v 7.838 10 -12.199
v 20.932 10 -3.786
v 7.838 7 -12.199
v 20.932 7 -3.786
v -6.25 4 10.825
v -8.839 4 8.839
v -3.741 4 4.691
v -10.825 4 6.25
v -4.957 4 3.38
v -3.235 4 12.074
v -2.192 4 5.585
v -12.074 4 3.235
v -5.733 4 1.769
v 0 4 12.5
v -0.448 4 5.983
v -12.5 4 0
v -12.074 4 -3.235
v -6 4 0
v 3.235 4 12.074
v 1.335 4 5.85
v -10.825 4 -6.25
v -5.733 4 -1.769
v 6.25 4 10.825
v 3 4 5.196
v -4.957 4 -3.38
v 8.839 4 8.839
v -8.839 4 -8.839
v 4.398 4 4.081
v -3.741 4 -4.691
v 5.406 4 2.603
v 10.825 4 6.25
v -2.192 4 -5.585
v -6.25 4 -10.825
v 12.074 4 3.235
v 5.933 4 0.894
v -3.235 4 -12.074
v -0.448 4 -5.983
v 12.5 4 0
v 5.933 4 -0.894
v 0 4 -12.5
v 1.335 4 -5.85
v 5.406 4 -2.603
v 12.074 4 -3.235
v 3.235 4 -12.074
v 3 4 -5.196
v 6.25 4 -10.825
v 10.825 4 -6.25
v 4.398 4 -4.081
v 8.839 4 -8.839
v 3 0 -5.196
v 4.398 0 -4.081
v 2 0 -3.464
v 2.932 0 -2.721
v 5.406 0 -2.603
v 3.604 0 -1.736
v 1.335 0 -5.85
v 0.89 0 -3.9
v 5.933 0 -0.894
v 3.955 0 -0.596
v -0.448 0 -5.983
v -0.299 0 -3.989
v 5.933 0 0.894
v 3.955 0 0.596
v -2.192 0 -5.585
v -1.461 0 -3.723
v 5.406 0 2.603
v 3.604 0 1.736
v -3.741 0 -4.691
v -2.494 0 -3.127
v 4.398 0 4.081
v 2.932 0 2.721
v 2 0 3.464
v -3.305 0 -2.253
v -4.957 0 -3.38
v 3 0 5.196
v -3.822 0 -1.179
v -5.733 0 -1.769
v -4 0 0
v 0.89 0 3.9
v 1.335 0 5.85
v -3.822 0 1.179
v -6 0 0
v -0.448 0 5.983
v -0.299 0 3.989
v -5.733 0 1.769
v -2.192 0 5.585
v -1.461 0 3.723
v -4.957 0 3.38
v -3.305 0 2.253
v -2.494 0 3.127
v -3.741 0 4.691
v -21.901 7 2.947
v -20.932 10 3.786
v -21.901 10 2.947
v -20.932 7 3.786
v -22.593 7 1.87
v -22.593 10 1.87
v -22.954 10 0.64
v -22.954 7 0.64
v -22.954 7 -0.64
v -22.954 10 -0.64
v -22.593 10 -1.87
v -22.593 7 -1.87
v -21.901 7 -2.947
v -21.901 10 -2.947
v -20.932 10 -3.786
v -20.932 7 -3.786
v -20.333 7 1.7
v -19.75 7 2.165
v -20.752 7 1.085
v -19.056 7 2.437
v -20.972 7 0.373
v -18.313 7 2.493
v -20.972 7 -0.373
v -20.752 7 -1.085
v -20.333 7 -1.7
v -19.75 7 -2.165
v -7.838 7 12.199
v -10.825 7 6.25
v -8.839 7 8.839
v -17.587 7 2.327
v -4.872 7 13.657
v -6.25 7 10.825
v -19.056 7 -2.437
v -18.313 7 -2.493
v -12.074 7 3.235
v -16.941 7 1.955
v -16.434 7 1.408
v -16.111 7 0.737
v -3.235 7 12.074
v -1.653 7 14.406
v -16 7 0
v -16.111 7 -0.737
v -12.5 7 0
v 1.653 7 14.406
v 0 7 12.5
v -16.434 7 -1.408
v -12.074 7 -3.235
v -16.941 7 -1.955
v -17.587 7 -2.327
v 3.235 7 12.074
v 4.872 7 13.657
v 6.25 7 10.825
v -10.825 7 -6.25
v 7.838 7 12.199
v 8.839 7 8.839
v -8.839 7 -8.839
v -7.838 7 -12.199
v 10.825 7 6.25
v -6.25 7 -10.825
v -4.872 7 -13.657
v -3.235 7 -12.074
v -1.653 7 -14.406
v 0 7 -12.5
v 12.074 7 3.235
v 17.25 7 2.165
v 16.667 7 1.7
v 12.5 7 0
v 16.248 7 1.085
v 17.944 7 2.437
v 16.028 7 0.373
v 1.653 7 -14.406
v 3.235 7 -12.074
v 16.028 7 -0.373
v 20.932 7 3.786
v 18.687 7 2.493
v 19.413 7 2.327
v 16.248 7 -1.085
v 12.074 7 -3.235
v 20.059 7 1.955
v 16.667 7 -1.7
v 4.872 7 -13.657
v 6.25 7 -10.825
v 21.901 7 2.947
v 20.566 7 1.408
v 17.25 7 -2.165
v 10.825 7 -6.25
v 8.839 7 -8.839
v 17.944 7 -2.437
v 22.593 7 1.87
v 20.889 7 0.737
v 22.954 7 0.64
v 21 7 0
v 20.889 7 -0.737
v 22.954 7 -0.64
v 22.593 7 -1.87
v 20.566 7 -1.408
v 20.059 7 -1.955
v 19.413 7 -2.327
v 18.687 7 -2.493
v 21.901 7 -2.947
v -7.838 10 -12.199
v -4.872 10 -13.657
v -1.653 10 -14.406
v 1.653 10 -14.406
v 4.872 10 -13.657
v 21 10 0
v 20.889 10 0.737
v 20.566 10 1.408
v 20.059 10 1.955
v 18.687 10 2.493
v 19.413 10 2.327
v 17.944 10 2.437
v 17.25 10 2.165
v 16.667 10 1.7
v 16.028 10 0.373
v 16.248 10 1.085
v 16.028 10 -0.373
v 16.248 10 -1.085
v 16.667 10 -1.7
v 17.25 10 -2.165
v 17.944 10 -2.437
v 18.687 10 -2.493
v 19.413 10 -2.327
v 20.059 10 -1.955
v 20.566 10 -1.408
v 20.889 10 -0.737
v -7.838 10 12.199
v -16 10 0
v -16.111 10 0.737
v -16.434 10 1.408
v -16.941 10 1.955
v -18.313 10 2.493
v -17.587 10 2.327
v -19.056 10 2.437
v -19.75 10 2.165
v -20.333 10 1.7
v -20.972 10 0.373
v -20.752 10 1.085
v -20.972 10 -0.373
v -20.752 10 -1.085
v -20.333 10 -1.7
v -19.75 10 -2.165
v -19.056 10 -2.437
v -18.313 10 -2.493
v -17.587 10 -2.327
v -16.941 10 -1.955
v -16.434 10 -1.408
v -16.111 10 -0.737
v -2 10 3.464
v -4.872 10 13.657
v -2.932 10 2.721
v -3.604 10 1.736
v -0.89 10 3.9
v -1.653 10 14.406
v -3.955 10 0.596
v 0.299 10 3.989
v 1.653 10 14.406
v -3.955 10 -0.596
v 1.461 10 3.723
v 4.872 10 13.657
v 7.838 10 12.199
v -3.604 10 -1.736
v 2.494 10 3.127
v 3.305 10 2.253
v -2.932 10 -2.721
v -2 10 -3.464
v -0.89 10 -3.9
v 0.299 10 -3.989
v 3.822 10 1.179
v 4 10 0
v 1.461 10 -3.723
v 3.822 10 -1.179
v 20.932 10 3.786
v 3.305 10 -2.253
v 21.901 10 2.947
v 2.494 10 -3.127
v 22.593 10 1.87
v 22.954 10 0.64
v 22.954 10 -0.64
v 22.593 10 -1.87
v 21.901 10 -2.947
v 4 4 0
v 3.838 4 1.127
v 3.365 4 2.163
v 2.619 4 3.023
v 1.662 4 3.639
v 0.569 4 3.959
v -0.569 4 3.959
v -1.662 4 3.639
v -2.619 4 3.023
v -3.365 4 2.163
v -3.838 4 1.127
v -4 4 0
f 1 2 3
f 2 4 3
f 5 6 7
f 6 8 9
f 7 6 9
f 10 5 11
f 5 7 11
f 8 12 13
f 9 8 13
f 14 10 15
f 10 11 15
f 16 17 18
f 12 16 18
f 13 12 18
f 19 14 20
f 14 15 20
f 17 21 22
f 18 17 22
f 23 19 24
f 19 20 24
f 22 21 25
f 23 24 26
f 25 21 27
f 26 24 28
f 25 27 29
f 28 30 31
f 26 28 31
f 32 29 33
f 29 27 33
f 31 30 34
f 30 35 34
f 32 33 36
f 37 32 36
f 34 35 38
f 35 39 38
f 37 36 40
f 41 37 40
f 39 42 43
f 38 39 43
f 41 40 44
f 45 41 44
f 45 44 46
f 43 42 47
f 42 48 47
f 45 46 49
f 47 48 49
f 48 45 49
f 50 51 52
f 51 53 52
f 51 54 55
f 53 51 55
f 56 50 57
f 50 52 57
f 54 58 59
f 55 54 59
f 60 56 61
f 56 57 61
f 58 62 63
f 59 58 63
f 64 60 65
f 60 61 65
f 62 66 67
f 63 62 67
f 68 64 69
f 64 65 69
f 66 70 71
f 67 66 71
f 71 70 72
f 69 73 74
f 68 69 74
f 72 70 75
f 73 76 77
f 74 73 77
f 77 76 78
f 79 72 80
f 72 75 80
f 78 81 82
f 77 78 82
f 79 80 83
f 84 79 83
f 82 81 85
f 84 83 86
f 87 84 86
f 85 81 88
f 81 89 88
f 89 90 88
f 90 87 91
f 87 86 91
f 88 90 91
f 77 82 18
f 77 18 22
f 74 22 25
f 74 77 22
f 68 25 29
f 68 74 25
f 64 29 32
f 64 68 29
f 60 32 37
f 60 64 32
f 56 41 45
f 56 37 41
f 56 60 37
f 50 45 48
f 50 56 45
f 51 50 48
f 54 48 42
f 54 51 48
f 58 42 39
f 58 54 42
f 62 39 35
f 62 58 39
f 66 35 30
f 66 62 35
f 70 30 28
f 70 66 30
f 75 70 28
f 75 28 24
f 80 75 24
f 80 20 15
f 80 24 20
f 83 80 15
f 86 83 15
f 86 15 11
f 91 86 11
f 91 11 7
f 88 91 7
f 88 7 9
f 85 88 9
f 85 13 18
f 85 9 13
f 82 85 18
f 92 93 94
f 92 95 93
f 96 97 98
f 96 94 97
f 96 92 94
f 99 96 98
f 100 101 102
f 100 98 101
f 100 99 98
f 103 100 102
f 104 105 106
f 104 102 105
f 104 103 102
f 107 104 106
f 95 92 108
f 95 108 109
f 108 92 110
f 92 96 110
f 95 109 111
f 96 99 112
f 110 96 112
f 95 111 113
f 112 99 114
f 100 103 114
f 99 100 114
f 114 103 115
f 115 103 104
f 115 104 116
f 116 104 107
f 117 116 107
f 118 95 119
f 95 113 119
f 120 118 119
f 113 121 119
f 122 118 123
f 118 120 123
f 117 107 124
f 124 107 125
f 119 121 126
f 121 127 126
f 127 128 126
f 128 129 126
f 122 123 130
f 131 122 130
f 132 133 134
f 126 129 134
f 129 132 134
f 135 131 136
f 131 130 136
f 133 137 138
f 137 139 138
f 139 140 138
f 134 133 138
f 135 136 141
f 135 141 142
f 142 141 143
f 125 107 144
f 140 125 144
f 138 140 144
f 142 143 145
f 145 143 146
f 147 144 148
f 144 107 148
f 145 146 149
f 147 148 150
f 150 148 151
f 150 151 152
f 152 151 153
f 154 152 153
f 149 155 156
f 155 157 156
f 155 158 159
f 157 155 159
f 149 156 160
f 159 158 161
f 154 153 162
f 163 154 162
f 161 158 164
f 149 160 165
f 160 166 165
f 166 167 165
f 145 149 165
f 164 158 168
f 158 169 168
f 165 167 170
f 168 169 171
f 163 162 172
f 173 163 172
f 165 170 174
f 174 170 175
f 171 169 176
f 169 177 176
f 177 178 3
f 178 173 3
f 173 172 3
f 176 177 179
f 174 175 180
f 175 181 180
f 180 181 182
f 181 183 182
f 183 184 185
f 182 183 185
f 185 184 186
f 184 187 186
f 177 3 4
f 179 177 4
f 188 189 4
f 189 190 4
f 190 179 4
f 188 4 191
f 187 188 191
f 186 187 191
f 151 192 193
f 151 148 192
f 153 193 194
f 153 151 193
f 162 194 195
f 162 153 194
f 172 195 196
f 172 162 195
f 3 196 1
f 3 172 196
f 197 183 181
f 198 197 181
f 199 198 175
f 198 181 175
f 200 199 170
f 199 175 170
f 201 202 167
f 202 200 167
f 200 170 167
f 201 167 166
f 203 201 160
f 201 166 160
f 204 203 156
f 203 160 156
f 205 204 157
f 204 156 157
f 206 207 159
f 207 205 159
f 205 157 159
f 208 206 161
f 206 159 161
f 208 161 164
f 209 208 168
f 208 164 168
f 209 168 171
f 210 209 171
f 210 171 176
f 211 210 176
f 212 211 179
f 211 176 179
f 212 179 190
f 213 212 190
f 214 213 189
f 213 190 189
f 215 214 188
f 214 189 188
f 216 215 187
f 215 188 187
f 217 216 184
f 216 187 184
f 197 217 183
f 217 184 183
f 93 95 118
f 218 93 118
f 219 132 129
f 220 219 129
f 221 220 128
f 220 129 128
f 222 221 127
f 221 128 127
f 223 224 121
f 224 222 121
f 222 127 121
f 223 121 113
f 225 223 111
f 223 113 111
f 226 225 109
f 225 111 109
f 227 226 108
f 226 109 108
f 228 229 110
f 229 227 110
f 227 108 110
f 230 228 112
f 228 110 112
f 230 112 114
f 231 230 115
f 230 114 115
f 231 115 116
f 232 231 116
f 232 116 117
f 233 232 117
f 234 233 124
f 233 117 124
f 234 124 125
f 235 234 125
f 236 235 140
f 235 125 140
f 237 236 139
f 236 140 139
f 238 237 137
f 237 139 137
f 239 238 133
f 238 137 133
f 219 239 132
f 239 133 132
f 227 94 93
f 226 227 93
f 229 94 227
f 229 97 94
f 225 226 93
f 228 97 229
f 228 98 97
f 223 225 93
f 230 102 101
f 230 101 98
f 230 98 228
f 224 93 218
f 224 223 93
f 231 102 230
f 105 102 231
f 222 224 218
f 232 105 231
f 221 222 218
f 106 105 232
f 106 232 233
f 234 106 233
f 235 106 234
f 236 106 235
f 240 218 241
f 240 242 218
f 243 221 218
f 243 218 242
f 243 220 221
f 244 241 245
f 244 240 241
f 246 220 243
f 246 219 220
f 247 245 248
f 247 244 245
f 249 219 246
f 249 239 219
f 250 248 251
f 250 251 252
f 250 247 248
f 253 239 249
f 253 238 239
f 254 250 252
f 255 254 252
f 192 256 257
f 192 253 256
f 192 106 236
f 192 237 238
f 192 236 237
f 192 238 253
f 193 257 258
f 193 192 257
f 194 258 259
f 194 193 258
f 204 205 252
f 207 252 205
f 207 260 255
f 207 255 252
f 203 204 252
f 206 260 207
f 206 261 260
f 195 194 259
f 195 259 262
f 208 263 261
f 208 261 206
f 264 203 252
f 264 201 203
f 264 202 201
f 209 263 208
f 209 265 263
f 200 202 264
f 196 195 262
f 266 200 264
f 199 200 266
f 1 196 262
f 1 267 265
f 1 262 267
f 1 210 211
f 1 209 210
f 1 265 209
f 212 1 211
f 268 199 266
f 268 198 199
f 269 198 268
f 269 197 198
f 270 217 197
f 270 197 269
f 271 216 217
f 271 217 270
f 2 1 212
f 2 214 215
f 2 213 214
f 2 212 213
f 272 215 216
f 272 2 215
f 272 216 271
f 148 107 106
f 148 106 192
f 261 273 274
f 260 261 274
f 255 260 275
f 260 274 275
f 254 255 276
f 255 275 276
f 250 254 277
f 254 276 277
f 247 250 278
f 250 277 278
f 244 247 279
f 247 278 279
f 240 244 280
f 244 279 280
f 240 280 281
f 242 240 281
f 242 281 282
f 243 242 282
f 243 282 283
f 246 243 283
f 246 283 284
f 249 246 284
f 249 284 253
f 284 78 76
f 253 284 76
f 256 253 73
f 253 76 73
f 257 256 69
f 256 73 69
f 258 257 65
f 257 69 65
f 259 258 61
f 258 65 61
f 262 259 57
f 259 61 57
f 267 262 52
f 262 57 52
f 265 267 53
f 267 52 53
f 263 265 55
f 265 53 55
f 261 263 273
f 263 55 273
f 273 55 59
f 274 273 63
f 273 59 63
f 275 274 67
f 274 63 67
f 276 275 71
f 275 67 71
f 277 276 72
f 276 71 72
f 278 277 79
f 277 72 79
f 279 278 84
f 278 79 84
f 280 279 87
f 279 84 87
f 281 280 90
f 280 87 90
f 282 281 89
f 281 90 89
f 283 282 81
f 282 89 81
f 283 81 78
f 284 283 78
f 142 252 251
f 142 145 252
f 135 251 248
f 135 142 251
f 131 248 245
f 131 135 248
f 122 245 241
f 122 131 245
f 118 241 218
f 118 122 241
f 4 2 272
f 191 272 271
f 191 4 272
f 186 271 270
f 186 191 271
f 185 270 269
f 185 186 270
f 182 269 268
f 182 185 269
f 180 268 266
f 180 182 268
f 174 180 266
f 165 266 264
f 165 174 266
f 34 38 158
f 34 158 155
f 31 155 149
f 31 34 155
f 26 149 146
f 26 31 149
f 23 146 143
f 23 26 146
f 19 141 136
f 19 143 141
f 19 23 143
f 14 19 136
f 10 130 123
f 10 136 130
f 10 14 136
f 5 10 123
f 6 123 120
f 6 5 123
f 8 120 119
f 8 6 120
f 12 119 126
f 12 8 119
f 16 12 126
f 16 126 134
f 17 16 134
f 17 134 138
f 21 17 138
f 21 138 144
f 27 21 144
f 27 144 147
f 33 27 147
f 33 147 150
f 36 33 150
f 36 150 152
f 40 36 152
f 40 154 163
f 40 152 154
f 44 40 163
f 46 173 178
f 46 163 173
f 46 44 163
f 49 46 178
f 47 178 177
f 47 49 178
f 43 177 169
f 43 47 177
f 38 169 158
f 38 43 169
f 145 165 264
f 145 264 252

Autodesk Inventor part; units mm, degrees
ref_plane "YZ Plane" through (0, 0, 0) normal (1, 0, 0) x (0, 1, 0)
ref_plane "XZ Plane" through (0, 0, 0) normal (0, 1, 0) x (-1, 0, 0)
ref_plane "XY Plane" through (0, 0, 0) normal (0, 0, 1) x (1, 0, 0)
sketch "Sketch1" plane through (0, 0, 0) normal (0, 1, 0) x (-1, 0, 0)
  circle A0 centre (0, 0) radius 4
  circle A1 centre (0, 0) radius 6
  dimension "d0" = 8
  dimension "d1" = 2
extrude "Extrusion1" add sketch "Sketch1" along normal blind 4
sketch "Sketch2" plane through (0, 4, 0) normal (0, 1, 0) x (1, 0, 0)
  circle A0 centre (0, 0) radius 12.5
  circle A1 centre (0, 0) radius 4 projected
  dimension "d4" = 25
extrude "Extrusion2" add sketch "Sketch2" along normal blind 3
sketch "Sketch3" plane through (0, 7, 0) normal (0, 1, 0) x (1, 0, 0)
  circle A0 centre (-18.5, 0) radius 2.5
  circle A1 centre (18.5, 0) radius 2.5
  circle A2 centre (0, 0) radius 12.5 construction
  circle A3 centre (0, 0) radius 14.5
  circle A4 centre (-18.5, 0) radius 4.5
  circle A5 centre (18.5, 0) radius 4.5
  line L0 (-20.9324, 3.7859) -> (-7.8378, 12.1991)
  line L1 (-20.9324, -3.7859) -> (-7.8378, -12.1991)
  line L2 (20.9324, 3.7859) -> (7.8378, 12.1991)
  line L3 (20.9324, -3.7859) -> (7.8378, -12.1991)
  circle A6 centre (0, 0) radius 4 projected
  point P0 (-14.3851, -1.8215)
  point P1 (-14.3851, 1.8215)
  point P2 (14.3851, 1.8215)
  point P3 (14.3851, -1.8215)
  dimension "d7" = 5
  dimension "d8" = 5
  dimension "d9" = 37
  dimension "d10" = 18.5
  dimension "d11" = 2
  dimension "d12" = 2
  dimension "d13" = 2
extrude "Extrusion3" add sketch "Sketch3" along normal blind 3
equation "\"d10\" = 0.5 * d9"
properties part number "screw_bracket"
